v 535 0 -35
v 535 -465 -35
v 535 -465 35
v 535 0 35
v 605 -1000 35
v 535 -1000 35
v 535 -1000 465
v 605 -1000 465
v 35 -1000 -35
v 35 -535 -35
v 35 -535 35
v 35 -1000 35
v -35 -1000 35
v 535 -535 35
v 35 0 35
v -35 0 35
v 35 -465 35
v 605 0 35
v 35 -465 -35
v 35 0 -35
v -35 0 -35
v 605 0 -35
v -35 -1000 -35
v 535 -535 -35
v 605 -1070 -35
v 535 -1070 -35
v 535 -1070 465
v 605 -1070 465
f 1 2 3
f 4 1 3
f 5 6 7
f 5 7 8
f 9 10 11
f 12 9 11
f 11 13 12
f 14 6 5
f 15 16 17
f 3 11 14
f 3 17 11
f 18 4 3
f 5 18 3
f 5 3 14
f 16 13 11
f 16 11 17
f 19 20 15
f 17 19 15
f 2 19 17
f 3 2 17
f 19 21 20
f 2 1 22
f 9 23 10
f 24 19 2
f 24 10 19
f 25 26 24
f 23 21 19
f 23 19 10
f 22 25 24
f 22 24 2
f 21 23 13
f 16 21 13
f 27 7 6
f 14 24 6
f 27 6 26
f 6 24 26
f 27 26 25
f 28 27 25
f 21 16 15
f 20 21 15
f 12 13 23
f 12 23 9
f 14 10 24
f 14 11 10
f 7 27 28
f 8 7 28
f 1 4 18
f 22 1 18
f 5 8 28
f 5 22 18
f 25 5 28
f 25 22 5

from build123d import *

# Parameters (mm, degrees)
F0_W     = 70
F0_H     = 70
F1_DEPTH = 1000
F3_DEPTH = 500
F4_W     = 70
F4_H     = 70
F5_DEPTH = 535
F6_W     = 70
F6_H     = 70
F7_DEPTH = 465
F8_W     = 70
F8_H     = 70
F9_DEPTH = 500


with BuildPart() as f1:
    # F0 (on Front) → F1 (new body)
    with BuildSketch(Plane.XZ):
        Rectangle(F0_W, F0_H)
    extrude(amount=F1_DEPTH)

    # F2 (on face) → F3 (join)
    with BuildSketch(Plane.YZ.offset(35)):
        Polygon((-465, 35), (-500, 35), (-535, 35), (-535, -35), (-465, -35), align=None)
    extrude(amount=F3_DEPTH)

    # F4 (on face) → F5 (join)
    with BuildSketch(Plane.XZ.offset(535)):
        with Locations((570, 0)):
            Rectangle(F4_W, F4_H)
    extrude(amount=-F5_DEPTH)

    # F6 (on face) → F7 (join)
    with BuildSketch(Plane.XZ.offset(535)):
        with Locations((570, 0)):
            Rectangle(F6_W, F6_H)
    extrude(amount=F7_DEPTH)

    # F8 (on face) → F9 (join)
    with BuildSketch(Plane(origin=(0, 0, -35), x_dir=(1, 0, 0), z_dir=(0, 0, -1))):
        with Locations((570, 1035)):
            Rectangle(F8_W, F8_H)
    extrude(amount=-F9_DEPTH)


solid = f1.part
